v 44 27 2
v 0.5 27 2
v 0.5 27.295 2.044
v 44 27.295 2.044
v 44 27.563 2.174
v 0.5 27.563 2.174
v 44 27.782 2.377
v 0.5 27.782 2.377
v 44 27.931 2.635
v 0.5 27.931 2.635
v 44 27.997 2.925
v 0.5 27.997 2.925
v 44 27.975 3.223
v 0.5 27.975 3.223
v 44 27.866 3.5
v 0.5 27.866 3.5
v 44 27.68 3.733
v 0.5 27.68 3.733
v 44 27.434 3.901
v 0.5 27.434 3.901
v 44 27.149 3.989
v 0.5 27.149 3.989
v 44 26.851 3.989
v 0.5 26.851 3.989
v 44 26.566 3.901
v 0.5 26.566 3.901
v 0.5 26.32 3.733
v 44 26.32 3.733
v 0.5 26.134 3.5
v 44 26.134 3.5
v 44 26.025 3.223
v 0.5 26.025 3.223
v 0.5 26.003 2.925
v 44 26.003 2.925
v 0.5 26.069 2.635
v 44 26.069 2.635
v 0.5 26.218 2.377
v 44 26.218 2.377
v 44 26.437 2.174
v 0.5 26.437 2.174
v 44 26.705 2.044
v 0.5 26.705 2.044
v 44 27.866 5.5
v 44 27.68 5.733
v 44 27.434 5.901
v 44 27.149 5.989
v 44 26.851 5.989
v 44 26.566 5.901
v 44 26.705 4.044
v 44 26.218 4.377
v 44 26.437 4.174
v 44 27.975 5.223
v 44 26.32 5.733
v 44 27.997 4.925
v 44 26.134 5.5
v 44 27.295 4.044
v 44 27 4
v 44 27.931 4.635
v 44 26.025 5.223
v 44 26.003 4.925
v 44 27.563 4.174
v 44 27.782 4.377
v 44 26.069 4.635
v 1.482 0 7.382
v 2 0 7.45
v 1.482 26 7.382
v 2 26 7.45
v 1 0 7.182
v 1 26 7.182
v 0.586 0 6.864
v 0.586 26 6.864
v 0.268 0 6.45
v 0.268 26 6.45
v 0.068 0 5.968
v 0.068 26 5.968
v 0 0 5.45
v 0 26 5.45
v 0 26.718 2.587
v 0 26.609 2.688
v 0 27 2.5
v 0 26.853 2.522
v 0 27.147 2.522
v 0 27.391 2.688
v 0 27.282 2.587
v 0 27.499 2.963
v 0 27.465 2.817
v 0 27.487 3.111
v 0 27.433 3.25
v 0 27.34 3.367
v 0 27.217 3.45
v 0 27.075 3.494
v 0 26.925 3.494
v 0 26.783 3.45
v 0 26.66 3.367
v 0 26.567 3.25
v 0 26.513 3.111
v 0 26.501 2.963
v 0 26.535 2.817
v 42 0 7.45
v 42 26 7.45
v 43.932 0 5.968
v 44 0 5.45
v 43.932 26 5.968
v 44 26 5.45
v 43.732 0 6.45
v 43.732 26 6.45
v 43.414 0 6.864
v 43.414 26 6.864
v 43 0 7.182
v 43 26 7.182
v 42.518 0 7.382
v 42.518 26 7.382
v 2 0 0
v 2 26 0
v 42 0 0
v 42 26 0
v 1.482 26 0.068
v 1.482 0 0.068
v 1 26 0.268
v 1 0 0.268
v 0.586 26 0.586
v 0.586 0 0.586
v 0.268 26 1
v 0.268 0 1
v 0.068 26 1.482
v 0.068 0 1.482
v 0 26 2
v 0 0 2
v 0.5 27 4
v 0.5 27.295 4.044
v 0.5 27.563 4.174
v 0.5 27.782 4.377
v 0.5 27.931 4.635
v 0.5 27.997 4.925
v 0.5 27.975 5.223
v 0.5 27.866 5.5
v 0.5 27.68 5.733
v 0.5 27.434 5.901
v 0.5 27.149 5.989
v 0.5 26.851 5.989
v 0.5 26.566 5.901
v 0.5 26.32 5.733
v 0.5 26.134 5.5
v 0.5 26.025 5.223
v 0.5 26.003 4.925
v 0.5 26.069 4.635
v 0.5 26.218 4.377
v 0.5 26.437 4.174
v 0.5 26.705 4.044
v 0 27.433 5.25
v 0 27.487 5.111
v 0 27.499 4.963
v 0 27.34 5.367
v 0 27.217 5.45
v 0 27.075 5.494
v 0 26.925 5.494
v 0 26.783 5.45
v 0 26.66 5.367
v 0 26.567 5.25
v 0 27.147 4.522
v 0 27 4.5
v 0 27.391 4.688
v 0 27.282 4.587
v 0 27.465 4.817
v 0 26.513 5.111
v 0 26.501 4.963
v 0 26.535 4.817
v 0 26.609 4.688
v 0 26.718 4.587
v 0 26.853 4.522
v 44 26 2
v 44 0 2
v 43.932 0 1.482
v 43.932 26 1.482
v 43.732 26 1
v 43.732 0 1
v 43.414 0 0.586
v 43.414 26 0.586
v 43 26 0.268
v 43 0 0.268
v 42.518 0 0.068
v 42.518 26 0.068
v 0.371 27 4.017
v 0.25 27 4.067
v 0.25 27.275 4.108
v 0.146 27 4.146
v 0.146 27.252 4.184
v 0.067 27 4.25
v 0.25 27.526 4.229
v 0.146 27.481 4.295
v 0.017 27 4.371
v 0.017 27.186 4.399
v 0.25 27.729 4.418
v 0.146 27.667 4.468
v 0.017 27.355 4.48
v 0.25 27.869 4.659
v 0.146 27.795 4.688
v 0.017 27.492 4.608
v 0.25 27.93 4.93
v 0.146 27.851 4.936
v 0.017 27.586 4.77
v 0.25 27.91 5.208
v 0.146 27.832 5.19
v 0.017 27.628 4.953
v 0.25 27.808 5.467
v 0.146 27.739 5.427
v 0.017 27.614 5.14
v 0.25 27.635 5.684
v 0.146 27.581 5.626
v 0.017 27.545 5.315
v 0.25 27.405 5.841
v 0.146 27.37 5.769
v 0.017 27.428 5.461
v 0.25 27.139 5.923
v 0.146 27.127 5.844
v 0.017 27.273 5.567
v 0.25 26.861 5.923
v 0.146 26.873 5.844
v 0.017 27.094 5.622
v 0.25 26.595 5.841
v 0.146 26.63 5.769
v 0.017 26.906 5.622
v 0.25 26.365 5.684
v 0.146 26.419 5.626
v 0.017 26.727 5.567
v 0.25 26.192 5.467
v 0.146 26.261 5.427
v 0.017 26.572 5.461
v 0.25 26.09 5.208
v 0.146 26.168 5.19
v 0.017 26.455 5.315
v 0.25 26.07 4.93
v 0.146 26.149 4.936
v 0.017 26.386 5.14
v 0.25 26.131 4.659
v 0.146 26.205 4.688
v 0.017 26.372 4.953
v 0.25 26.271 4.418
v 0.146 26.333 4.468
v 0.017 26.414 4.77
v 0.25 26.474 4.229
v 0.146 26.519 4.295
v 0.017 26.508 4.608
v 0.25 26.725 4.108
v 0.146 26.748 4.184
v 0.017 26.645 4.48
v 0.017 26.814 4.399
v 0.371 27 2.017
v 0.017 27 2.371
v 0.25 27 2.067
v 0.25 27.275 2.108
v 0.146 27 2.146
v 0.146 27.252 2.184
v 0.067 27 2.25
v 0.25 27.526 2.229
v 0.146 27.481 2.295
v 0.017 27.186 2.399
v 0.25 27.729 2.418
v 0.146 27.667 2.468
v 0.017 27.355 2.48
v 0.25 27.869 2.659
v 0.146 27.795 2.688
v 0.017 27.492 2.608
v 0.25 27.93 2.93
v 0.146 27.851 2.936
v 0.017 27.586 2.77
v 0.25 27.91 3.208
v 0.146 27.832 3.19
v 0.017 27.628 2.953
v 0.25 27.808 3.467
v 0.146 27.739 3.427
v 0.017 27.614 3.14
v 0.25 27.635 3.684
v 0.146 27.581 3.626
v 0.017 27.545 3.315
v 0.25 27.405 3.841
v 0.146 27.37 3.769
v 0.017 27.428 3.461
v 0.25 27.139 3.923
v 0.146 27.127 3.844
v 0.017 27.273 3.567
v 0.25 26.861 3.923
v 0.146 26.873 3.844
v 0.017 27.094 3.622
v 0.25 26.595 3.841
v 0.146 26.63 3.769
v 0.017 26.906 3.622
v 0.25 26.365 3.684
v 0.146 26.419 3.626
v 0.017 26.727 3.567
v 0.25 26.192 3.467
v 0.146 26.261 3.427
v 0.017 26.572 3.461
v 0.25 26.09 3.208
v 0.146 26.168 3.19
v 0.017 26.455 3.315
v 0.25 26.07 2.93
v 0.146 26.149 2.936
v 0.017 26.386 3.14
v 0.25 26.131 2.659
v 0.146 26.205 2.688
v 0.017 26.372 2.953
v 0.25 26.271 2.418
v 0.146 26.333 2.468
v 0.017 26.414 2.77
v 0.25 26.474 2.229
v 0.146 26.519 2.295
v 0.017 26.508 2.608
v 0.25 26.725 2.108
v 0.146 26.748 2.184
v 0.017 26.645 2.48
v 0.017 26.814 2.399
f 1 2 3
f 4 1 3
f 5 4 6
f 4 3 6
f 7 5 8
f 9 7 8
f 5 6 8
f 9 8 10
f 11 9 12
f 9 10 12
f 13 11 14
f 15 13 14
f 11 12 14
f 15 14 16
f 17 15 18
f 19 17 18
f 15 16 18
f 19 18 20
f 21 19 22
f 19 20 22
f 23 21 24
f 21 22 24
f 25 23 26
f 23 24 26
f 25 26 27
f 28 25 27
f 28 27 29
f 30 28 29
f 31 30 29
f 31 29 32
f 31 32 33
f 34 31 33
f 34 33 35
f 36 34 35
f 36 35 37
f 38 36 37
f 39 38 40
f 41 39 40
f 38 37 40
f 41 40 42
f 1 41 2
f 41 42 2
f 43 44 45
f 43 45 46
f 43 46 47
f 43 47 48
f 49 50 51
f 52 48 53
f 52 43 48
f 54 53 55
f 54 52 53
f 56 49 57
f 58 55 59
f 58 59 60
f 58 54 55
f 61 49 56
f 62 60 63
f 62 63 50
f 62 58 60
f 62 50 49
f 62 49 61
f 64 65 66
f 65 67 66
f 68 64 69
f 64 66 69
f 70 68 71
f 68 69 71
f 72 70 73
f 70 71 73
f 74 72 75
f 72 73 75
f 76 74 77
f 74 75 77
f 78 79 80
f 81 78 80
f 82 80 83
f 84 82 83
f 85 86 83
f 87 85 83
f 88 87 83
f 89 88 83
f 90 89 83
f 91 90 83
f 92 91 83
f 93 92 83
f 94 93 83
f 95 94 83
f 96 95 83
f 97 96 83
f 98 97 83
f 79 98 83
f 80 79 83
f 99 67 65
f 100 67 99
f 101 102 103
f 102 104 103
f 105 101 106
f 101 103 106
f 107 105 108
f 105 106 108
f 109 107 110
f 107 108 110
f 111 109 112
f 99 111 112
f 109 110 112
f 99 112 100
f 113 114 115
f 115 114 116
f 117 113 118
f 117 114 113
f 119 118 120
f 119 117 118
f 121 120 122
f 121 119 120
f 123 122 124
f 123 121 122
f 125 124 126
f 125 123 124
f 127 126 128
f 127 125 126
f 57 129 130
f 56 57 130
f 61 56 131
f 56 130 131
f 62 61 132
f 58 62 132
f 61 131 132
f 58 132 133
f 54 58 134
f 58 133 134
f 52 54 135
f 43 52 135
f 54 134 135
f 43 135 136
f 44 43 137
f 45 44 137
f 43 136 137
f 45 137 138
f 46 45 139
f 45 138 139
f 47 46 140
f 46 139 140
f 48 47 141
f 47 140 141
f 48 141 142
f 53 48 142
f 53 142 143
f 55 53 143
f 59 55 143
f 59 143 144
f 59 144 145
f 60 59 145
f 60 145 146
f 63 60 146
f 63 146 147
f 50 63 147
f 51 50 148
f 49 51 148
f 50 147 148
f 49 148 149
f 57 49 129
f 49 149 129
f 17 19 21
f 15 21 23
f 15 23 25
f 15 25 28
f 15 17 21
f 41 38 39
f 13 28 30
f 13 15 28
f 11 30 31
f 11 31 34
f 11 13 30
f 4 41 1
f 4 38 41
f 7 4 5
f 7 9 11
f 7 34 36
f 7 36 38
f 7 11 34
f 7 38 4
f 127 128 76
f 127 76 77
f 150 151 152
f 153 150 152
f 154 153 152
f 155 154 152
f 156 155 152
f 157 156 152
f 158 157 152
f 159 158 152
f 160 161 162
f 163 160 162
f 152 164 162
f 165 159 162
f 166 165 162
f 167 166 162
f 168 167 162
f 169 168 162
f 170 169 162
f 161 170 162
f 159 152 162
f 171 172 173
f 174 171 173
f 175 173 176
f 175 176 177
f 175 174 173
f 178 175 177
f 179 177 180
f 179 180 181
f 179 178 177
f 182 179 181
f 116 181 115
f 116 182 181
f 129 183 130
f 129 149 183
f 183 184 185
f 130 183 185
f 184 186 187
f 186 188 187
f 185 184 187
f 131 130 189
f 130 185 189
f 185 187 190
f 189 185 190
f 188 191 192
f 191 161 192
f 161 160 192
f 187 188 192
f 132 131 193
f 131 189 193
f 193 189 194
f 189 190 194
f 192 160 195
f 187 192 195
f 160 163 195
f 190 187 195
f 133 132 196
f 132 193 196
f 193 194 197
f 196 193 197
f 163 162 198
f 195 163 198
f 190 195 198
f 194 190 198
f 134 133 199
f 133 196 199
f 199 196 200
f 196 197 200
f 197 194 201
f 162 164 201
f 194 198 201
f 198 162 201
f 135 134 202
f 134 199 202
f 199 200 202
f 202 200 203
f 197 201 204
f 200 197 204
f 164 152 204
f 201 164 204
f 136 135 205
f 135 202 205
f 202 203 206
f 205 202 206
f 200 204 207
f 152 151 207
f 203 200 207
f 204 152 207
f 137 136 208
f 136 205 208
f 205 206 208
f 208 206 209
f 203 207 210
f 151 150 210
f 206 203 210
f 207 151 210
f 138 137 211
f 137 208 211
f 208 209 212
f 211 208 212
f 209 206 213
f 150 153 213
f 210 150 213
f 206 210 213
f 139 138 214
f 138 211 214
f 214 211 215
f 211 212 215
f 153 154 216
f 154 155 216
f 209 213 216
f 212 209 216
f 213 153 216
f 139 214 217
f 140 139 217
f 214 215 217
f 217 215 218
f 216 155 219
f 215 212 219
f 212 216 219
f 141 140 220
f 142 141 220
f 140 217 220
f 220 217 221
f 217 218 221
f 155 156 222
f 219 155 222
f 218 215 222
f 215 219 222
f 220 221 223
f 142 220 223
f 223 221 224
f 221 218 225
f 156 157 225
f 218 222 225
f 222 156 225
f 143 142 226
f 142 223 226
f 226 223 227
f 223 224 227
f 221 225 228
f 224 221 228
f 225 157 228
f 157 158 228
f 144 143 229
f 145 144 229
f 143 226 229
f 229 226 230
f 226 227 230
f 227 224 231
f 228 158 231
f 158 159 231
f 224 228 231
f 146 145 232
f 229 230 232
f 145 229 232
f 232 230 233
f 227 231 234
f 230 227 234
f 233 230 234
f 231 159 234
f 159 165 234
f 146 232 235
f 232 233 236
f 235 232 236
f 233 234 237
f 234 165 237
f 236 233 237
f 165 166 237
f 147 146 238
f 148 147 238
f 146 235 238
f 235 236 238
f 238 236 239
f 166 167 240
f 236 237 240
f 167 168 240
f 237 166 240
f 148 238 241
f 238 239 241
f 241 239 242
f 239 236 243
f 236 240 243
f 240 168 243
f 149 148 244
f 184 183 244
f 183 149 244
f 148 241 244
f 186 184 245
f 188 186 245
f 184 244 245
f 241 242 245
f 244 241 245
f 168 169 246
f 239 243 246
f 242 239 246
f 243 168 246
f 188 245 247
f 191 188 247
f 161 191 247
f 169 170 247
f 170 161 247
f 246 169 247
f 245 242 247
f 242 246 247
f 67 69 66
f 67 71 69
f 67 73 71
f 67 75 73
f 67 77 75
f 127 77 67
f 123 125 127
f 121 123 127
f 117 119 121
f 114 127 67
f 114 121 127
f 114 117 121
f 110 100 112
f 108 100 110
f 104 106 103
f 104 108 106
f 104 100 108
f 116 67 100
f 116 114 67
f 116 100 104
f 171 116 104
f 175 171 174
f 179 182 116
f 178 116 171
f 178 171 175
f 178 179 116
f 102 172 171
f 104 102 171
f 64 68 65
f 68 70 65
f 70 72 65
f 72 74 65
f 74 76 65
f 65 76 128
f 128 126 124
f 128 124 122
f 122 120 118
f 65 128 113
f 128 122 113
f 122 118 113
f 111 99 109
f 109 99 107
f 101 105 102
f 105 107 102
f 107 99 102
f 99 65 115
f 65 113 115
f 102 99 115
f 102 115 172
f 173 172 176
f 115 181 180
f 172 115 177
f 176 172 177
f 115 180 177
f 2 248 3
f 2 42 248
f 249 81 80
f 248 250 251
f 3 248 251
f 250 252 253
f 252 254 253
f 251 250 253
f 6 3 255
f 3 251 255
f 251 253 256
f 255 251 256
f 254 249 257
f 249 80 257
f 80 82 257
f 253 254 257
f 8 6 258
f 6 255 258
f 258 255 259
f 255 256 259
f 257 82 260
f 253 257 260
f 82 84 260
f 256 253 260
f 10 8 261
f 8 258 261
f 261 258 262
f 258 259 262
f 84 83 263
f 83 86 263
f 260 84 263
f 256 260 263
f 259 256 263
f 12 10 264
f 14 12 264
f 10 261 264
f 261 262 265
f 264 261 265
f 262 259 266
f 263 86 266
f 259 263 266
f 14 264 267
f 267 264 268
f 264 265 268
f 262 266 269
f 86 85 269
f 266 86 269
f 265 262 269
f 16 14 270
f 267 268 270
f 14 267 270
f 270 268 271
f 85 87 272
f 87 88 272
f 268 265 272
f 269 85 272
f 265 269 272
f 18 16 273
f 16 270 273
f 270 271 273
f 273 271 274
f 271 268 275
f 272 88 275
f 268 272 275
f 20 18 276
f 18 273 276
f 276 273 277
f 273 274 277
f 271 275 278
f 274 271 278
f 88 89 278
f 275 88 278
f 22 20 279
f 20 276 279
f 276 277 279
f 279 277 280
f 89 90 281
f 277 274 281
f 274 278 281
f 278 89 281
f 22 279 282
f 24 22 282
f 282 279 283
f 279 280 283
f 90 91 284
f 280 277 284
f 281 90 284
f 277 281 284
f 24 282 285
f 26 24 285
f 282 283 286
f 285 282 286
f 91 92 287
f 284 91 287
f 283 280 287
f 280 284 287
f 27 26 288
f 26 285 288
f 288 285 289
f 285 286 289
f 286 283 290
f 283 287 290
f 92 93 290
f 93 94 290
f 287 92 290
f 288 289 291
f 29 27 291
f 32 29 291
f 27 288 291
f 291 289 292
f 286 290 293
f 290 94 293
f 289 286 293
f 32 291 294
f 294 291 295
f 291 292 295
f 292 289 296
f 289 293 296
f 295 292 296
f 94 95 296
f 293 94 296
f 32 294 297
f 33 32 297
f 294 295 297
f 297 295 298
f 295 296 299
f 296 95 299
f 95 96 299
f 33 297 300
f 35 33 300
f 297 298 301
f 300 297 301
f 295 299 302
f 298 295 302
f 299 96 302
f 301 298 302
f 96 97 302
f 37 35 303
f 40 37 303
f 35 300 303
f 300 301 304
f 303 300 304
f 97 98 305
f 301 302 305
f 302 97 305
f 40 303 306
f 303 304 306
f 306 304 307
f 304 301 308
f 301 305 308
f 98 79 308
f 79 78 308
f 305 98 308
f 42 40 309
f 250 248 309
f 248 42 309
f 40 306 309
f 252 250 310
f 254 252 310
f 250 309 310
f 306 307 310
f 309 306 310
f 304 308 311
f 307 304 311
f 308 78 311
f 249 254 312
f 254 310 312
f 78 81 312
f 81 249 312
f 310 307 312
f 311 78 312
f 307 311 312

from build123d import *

# Parameters (mm, degrees)
SKETCH_W                = 44
SKETCH_H                = 26
PAD_DEPTH               = 7.45
FILLET_R                = 2
FILLET001_R             = 2
CYLINDER_R              = 1
CYLINDER_DEPTH          = 44
CYLINDER_PITCH_ANGLE    = 90
FILLET002_R             = 0.5
CYLINDER001_R           = 1
CYLINDER001_DEPTH       = 44
CYLINDER001_PITCH_ANGLE = 90
FILLET003_R             = 0.5


with BuildPart() as fillet001:
    # Sketch → Pad (new body)
    with BuildSketch(Plane.XY):
        with Locations((22, 13)):
            Rectangle(SKETCH_W, SKETCH_H)
    extrude(amount=PAD_DEPTH)

    # Fillet
    fillet_edges = [fillet001.edges().sort_by_distance(p)[0] for p in [
        (44, 13, 0),
        (44, 13, 7.45),
    ]]
    fillet(fillet_edges, radius=FILLET_R)

    # Fillet001
    fillet001_edges = [fillet001.edges().sort_by_distance(p)[0] for p in [
        (0, 13, 7.45),
        (0, 13, 0),
    ]]
    fillet(fillet001_edges, radius=FILLET001_R)


with BuildPart() as fillet002:
    # Cylinder → Cylinder (new body)
    with BuildSketch(Plane.XY):
        Circle(CYLINDER_R)
    extrude(amount=CYLINDER_DEPTH)


with BuildPart() as fillet002_1:
    # Cylinder pitch: moved
    add(fillet002.part.rotate(Axis((0, 0, 0), (0, 1, 0)), CYLINDER_PITCH_ANGLE))


with BuildPart() as fillet002_2:
    # Cylinder placement: moved
    add(fillet002_1.part.moved(Location((0, 27, 5))))

    # Fillet002
    fillet002_edges = [fillet002_2.edges().sort_by_distance(p)[0] for p in [
        (0, 27, 6),
    ]]
    fillet(fillet002_edges, radius=FILLET002_R)


with BuildPart() as fillet003:
    # Cylinder001 → Cylinder001 (new body)
    with BuildSketch(Plane.XY):
        Circle(CYLINDER001_R)
    extrude(amount=CYLINDER001_DEPTH)


with BuildPart() as fillet003_1:
    # Cylinder001 pitch: moved
    add(fillet003.part.rotate(Axis((0, 0, 0), (0, 1, 0)), CYLINDER001_PITCH_ANGLE))


with BuildPart() as fillet003_2:
    # Cylinder001 placement: moved
    add(fillet003_1.part.moved(Location((0, 27, 3))))

    # Fillet003
    fillet003_edges = [fillet003_2.edges().sort_by_distance(p)[0] for p in [
        (0, 27, 4),
    ]]
    fillet(fillet003_edges, radius=FILLET003_R)


solid = Compound([fillet001.part, fillet002_2.part, fillet003_2.part])
